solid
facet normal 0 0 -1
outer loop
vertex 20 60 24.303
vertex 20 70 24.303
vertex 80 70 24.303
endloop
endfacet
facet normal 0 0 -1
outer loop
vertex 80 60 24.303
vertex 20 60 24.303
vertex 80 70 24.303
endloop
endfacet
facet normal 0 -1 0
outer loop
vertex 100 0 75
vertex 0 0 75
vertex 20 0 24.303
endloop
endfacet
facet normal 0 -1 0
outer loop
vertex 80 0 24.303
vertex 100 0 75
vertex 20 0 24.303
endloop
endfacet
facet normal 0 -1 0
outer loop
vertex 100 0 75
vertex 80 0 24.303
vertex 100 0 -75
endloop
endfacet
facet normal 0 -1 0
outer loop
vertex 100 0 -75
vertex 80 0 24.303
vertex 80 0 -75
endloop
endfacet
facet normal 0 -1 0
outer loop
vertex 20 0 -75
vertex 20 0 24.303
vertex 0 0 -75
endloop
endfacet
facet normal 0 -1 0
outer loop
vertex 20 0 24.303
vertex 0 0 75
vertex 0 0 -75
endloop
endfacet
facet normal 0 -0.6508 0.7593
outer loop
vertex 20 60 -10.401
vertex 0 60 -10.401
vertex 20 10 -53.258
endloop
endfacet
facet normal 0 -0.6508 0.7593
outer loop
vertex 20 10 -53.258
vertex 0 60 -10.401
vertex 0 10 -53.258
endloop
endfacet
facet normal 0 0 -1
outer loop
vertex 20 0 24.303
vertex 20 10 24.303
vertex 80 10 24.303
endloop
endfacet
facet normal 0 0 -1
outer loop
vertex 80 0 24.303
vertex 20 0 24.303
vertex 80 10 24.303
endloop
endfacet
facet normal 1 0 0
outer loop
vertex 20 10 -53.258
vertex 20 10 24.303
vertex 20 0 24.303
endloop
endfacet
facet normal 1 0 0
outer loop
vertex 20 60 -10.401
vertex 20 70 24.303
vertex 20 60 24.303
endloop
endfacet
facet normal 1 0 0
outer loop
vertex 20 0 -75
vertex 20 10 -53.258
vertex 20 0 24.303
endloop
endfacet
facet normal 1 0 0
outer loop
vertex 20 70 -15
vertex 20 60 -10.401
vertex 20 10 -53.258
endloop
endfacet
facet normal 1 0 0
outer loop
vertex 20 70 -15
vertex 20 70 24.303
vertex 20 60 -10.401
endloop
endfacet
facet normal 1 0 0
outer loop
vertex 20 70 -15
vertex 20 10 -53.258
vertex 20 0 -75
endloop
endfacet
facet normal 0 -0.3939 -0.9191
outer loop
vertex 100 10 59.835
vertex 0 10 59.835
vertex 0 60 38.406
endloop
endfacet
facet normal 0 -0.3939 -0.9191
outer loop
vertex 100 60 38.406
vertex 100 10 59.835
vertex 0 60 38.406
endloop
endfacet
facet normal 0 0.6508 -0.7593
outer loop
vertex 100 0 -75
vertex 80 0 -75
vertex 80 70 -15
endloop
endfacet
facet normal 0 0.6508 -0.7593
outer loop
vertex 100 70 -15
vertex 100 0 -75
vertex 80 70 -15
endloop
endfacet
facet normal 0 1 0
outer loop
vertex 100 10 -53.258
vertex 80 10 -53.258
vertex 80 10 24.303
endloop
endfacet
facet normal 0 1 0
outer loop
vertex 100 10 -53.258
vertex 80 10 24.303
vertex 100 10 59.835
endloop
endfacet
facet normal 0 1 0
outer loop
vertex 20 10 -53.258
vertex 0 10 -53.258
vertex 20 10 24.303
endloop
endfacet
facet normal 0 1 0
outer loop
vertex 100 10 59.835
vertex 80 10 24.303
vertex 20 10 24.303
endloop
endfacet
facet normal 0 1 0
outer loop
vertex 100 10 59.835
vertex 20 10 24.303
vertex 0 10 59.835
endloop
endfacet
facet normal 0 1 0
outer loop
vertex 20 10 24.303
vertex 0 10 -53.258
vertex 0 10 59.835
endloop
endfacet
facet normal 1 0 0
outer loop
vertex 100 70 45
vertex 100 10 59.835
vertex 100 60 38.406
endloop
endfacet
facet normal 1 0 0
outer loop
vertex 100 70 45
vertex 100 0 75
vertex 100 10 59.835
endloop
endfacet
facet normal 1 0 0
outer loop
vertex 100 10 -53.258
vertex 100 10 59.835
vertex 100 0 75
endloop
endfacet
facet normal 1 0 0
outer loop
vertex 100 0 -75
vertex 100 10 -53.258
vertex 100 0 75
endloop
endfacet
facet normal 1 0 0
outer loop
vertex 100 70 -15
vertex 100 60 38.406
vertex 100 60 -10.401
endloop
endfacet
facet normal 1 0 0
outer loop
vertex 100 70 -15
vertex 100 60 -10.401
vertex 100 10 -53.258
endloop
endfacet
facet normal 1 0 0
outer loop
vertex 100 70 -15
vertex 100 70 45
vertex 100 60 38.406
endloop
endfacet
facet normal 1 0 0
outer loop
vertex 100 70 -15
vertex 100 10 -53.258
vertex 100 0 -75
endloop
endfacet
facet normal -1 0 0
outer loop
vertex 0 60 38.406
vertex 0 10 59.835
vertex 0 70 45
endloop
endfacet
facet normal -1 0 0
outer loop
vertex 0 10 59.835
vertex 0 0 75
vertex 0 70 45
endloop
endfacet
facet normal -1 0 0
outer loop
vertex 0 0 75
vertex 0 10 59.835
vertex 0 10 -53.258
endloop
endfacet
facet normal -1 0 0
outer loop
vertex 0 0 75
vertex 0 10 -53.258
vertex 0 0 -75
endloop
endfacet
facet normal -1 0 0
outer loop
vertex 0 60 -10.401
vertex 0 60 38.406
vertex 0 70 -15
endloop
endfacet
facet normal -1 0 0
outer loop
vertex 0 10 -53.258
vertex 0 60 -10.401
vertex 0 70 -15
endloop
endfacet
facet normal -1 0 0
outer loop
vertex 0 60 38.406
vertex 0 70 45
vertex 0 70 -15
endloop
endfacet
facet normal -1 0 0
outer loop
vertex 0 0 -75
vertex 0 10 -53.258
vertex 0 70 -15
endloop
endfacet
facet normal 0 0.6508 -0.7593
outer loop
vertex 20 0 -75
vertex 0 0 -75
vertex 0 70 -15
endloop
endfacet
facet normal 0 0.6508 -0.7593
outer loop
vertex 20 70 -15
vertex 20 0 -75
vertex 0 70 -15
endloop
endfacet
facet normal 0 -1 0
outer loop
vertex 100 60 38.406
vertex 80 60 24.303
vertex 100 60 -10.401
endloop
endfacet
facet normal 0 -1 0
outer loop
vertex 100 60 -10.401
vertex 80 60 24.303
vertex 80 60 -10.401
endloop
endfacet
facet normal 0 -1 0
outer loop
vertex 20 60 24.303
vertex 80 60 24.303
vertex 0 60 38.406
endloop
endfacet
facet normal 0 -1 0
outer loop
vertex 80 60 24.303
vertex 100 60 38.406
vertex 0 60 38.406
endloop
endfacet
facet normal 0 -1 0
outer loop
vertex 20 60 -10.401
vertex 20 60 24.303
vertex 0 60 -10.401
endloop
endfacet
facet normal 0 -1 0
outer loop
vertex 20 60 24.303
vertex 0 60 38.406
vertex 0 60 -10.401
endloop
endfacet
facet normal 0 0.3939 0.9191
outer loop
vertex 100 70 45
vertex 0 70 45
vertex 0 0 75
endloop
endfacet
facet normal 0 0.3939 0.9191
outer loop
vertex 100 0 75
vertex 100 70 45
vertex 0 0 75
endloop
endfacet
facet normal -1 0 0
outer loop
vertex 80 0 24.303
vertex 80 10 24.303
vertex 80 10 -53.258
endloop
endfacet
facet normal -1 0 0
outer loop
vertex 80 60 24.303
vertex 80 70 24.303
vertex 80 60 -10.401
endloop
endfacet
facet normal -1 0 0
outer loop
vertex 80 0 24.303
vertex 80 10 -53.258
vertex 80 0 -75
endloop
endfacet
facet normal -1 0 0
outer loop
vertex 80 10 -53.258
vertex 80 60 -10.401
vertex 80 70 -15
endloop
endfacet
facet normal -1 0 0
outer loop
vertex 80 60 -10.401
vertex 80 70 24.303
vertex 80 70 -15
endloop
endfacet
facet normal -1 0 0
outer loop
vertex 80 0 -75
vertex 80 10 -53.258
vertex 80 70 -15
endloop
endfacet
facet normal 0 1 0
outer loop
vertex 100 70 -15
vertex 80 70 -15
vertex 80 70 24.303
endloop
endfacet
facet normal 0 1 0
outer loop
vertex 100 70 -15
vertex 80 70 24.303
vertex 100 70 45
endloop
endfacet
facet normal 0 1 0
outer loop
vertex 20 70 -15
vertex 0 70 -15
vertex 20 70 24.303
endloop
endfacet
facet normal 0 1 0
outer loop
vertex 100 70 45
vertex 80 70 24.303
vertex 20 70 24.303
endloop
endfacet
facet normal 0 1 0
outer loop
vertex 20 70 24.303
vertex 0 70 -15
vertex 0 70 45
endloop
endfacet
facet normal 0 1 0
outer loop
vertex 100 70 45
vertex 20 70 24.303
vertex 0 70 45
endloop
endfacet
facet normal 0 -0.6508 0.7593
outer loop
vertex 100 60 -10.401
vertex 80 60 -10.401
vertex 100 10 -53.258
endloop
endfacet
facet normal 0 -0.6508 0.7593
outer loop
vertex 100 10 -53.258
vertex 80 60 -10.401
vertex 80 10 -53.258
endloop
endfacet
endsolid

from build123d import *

# Parameters (mm, degrees)
BOSS_EXTRUDE1_DEPTH = 100
SKETCH4_W           = 60
SKETCH4_H           = 100
CUT_EXTRUDE2_DEPTH  = 71


with BuildPart() as part:
    # Sketch1 → Boss-Extrude1 (new body)
    with BuildSketch(Plane(origin=(0, 0, 0), x_dir=(0, 0, -1), z_dir=(1, 0, 0))):
        Polygon((-75, 0), (75, 0), (15, 70), (-45, 70), align=None)
        Polygon((-38.40603842, 60), (10.400650775, 60), (53.257793632, 10), (-59.834609849, 10), align=None, mode=Mode.SUBTRACT)
    extrude(amount=BOSS_EXTRUDE1_DEPTH)

    # Sketch4 → Cut-Extrude2 (cut, through all)
    with BuildSketch(Plane(origin=(0, 70, 0), x_dir=(1, 0, 0), z_dir=(0, 1, 0))):
        with Locations((50, 25.697233142)):
            Rectangle(SKETCH4_W, SKETCH4_H)
    extrude(amount=-CUT_EXTRUDE2_DEPTH, mode=Mode.SUBTRACT)


solid = part.part
